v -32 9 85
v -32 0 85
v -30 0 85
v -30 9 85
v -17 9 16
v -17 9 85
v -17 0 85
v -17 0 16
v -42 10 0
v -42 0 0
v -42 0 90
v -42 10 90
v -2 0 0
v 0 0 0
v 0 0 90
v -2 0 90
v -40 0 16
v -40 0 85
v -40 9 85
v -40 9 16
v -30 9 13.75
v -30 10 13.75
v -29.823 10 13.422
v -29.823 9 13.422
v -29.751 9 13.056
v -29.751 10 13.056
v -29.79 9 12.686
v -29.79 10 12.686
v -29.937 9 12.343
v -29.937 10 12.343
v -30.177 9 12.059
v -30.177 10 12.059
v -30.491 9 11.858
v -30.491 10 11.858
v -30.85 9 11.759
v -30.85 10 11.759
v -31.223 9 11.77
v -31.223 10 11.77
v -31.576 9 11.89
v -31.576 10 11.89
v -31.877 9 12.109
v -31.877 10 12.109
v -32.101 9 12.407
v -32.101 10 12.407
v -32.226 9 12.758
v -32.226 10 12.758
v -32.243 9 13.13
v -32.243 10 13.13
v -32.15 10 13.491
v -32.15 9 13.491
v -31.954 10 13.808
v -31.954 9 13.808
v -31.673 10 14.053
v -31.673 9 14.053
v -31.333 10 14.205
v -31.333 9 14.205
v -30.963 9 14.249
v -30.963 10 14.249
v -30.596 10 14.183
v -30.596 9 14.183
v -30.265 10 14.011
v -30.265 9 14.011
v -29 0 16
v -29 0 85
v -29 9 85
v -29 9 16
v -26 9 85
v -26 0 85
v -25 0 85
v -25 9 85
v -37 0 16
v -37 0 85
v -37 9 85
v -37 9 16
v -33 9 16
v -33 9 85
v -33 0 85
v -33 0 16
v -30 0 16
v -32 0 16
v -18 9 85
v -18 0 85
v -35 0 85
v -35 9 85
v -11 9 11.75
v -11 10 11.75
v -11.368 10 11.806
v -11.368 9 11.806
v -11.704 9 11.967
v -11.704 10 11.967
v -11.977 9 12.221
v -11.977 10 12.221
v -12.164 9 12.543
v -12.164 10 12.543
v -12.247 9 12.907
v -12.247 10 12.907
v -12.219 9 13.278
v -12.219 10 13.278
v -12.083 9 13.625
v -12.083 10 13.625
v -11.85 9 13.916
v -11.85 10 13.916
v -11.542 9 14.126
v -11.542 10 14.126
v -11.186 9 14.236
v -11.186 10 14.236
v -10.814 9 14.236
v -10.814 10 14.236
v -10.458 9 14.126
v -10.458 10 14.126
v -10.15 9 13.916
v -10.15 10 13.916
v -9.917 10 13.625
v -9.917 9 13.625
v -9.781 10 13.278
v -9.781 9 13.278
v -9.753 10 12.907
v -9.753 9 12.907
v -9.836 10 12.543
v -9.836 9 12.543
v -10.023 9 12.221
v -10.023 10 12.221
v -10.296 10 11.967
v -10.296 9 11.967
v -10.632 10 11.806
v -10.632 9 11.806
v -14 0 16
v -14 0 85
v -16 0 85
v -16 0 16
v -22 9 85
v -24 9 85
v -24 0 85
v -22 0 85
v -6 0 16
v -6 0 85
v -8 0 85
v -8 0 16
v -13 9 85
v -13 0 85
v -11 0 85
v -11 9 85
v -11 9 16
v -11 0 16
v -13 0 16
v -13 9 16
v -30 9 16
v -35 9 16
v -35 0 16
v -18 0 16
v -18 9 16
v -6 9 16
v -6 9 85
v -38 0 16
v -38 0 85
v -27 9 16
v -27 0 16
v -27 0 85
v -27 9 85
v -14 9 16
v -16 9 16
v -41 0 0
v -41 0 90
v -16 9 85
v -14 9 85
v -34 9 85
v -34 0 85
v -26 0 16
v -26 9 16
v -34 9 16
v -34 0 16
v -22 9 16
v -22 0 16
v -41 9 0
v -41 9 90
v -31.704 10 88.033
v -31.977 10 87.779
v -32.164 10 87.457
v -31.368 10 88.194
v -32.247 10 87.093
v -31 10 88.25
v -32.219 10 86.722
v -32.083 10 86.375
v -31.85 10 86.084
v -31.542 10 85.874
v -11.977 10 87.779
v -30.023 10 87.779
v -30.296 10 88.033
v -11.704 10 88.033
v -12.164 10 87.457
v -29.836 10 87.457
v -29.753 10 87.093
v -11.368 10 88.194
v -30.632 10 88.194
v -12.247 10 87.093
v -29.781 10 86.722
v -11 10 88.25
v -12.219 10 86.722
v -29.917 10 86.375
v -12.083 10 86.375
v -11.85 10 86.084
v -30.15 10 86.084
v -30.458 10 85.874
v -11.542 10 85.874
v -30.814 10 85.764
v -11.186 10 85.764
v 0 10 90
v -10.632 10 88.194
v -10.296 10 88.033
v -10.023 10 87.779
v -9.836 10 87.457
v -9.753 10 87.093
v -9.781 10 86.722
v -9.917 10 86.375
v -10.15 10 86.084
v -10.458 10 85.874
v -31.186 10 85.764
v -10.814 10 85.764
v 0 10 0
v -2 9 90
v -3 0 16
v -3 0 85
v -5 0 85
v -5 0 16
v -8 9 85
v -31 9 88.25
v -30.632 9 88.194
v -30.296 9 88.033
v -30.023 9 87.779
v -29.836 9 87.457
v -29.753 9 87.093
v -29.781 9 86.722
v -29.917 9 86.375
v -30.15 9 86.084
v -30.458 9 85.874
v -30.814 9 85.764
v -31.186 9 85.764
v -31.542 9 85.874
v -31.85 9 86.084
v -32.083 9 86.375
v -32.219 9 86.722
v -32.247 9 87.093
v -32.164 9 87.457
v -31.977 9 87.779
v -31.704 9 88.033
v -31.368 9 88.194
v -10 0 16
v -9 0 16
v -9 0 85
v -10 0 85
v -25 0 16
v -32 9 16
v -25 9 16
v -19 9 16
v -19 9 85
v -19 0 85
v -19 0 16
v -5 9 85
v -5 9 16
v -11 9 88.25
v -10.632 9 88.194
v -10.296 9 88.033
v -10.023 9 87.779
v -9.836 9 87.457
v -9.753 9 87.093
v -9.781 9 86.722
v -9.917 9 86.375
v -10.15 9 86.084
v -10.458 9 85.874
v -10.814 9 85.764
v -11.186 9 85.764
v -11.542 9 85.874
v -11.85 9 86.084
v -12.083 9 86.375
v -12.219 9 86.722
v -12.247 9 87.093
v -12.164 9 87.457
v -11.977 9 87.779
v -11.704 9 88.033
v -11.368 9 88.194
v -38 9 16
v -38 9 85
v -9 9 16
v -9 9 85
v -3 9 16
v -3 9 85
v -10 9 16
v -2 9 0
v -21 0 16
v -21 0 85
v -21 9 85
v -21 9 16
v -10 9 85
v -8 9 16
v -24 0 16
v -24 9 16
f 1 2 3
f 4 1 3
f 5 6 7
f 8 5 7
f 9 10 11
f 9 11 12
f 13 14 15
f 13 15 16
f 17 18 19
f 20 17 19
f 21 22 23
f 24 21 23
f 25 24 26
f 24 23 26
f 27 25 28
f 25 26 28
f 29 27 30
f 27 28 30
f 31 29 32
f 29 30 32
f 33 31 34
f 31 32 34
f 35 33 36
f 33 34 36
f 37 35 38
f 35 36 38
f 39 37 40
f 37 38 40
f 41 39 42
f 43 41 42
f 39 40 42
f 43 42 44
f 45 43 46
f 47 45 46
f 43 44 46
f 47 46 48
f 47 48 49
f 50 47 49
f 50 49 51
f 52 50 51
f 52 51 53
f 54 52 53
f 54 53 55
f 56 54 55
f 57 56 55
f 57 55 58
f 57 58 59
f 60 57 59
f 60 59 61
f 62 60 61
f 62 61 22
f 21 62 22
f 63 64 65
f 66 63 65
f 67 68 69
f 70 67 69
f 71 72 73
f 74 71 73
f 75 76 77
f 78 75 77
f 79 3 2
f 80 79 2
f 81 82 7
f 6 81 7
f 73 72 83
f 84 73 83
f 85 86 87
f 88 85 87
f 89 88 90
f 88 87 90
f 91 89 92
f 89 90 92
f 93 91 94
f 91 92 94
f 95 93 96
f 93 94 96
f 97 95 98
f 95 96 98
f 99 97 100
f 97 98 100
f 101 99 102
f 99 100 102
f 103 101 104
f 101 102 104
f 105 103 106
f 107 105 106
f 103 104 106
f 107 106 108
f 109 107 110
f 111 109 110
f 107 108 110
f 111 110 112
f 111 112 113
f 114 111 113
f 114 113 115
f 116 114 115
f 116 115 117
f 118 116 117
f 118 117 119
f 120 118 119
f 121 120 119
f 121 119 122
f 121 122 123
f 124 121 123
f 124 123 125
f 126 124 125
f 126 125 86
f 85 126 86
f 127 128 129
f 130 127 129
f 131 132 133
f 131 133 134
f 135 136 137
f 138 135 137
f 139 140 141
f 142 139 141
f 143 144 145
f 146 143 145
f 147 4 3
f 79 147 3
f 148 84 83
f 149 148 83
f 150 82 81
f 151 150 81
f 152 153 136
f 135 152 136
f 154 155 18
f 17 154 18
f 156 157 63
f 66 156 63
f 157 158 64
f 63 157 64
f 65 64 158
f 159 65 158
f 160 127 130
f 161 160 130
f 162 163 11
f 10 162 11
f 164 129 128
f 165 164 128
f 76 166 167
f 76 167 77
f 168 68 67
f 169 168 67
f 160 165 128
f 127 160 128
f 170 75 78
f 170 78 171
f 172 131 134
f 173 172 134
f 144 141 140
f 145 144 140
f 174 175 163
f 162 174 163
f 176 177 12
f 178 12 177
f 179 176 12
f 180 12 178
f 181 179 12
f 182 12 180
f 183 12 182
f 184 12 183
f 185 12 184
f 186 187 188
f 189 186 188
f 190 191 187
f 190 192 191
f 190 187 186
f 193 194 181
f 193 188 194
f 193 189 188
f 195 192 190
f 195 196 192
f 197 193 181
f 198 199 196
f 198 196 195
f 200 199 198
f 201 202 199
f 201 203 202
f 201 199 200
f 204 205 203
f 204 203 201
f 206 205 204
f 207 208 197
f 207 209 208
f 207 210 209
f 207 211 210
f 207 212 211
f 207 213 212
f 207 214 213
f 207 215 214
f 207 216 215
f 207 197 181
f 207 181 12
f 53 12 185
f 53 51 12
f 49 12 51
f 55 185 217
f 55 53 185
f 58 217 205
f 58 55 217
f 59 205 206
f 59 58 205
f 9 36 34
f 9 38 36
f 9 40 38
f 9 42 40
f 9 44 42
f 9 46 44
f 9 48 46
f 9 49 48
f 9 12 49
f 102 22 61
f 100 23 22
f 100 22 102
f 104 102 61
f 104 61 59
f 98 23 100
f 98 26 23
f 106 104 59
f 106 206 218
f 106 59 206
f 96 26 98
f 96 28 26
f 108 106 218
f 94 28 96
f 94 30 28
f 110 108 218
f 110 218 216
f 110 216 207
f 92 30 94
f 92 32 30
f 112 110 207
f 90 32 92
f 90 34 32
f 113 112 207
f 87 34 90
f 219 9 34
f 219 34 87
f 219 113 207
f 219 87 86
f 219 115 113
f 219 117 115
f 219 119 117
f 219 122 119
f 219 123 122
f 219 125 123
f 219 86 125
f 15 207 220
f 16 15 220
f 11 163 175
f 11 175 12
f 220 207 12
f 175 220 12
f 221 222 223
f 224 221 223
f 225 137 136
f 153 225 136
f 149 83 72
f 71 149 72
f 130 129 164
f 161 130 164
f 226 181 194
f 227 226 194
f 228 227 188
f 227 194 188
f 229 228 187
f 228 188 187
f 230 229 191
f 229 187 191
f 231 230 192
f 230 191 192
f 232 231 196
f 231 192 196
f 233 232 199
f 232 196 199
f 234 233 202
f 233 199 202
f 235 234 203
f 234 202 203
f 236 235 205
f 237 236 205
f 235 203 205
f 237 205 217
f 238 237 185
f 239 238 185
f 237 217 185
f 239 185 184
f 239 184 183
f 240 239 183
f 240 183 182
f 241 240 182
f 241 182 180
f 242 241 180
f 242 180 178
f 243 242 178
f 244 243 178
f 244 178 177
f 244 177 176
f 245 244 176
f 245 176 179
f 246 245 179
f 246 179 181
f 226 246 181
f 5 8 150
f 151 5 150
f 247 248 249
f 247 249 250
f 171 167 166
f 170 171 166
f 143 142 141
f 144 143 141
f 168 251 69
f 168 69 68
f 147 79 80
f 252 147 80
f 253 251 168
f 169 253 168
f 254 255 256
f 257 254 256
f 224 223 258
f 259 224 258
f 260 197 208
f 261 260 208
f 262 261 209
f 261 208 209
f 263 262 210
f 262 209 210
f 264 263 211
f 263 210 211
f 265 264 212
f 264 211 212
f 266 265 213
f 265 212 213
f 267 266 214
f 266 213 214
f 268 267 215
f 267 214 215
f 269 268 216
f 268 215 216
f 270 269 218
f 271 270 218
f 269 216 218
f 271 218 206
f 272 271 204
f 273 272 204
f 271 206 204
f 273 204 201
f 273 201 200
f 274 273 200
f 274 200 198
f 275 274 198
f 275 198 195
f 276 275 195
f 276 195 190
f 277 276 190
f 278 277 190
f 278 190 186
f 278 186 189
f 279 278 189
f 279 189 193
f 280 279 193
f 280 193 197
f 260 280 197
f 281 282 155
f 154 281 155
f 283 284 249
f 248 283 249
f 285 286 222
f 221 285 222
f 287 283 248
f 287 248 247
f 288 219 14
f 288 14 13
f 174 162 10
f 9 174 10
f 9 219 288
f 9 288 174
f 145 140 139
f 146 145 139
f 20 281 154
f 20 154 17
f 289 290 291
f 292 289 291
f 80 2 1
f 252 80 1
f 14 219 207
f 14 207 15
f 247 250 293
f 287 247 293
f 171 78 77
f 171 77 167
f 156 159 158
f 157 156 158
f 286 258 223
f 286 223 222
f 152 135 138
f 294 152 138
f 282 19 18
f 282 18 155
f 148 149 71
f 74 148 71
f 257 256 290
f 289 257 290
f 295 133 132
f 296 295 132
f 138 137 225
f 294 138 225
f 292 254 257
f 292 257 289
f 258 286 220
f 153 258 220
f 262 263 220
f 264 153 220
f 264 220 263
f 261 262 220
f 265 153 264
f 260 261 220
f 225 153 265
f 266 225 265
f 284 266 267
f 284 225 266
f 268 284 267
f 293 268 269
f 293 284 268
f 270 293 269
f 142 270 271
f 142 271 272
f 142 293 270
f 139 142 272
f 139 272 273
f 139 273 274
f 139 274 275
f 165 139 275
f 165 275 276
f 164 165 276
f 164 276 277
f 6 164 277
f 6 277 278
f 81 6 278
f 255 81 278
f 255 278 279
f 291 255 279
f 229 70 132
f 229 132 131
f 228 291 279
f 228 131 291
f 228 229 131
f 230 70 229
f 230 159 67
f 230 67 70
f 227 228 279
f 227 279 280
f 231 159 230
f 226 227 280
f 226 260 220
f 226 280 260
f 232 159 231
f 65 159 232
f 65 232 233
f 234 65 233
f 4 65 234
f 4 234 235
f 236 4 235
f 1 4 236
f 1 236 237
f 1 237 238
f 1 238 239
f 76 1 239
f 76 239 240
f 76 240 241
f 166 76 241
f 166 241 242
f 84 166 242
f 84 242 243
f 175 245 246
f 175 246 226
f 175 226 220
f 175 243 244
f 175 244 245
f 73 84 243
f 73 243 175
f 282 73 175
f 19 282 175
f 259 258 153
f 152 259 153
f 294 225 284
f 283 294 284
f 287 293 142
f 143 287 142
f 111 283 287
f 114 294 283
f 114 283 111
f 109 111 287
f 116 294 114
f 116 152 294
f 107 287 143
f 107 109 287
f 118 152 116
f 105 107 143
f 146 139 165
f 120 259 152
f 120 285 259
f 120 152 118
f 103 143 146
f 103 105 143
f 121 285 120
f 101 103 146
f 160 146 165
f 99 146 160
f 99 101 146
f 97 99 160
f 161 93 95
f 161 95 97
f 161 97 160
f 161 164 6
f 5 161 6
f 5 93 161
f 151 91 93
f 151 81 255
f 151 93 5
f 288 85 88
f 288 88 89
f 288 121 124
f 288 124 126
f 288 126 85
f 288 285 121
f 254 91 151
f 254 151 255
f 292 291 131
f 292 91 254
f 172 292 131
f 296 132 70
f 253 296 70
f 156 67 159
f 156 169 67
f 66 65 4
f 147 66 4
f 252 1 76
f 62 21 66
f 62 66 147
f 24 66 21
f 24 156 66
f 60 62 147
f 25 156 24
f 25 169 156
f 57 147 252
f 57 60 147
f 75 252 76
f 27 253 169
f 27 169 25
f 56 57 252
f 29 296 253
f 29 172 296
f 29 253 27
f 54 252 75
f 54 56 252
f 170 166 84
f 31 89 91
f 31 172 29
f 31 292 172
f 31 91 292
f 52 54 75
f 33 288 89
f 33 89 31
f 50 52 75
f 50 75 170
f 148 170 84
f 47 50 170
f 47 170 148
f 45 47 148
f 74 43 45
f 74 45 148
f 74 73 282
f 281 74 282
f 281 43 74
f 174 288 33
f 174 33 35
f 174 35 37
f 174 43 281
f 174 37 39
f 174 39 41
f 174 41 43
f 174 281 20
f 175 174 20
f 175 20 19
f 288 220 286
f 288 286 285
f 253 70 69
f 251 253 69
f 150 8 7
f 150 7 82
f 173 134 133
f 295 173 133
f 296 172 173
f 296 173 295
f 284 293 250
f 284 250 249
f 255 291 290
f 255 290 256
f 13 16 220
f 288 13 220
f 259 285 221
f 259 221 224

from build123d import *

# Parameters (mm, degrees)
BOSS_EXTRU_1_DEPTH      = 90
ESQUISSE3_W             = 39
ESQUISSE3_H             = 9
ENL_V_MAT_EXTRU_1_DEPTH = 5
ESQUISSE4_R             = 1.25
ENL_V_MAT_EXTRU_2_DEPTH = 5
ESQUISSE5_W             = 39
ESQUISSE5_H             = 9
ENL_V_MAT_EXTRU_3_DEPTH = 16


with BuildPart() as part:
    # Esquisse1 → Boss.-Extru.1 (new body)
    with BuildSketch(Plane.XY):
        Polygon((0, 0), (-2, 0), (-2, 9), (-3, 9), (-3, 0), (-5, 0), (-5, 9), (-6, 9), (-6, 0), (-8, 0), (-8, 9), (-9, 9), (-9, 0), (-10, 0), (-10, 9), (-11, 9), (-11, 0), (-13, 0), (-13, 9), (-14, 9), (-14, 0), (-16, 0), (-16, 9), (-17, 9), (-17, 0), (-18, 0), (-18, 9), (-19, 9), (-19, 0), (-21, 0), (-21, 9), (-22, 9), (-22, 0), (-24, 0), (-24, 9), (-25, 9), (-25, 0), (-26, 0), (-26, 9), (-27, 9), (-27, 0), (-29, 0), (-29, 9), (-30, 9), (-30, 0), (-32, 0), (-32, 9), (-33, 9), (-33, 0), (-34, 0), (-34, 9), (-35, 9), (-35, 0), (-37, 0), (-37, 9), (-38, 9), (-38, 0), (-40, 0), (-40, 9), (-41, 9), (-41, 0), (-42, 0), (-42, 10), (0, 10), align=None)
    extrude(amount=BOSS_EXTRU_1_DEPTH)

    # Esquisse3 → Enlèv. mat.-Extru.1 (cut)
    with BuildSketch(Plane.XY.offset(90)):
        with Locations((-21.5, 4.5)):
            Rectangle(ESQUISSE3_W, ESQUISSE3_H)
    extrude(amount=-ENL_V_MAT_EXTRU_1_DEPTH, mode=Mode.SUBTRACT)

    # Esquisse4 → Enlèv. mat.-Extru.2 (cut)
    with BuildSketch(Plane(origin=(0, 10, 0), x_dir=(1, 0, 0), z_dir=(0, 1, 0))):
        with Locations(Location((-31, -87, 0), (0, 0, 270))):
            Circle(ESQUISSE4_R)
        with Locations(Location((-11, -87, 0), (0, 0, 270))):
            Circle(ESQUISSE4_R)
        with Locations(Location((-11, -13, 0), (0, 0, 90))):
            Circle(ESQUISSE4_R)
        with Locations(Location((-31, -13, 0), (0, 0, 323.130102354))):
            Circle(ESQUISSE4_R)
    extrude(amount=-ENL_V_MAT_EXTRU_2_DEPTH, mode=Mode.SUBTRACT)

    # Esquisse5 → Enlèv. mat.-Extru.3 (cut)
    with BuildSketch(Plane(origin=(0, 0, 0), x_dir=(-1, 0, 0), z_dir=(0, 0, -1))):
        with Locations((21.5, 4.5)):
            Rectangle(ESQUISSE5_W, ESQUISSE5_H)
    extrude(amount=-ENL_V_MAT_EXTRU_3_DEPTH, mode=Mode.SUBTRACT)


solid = part.part
